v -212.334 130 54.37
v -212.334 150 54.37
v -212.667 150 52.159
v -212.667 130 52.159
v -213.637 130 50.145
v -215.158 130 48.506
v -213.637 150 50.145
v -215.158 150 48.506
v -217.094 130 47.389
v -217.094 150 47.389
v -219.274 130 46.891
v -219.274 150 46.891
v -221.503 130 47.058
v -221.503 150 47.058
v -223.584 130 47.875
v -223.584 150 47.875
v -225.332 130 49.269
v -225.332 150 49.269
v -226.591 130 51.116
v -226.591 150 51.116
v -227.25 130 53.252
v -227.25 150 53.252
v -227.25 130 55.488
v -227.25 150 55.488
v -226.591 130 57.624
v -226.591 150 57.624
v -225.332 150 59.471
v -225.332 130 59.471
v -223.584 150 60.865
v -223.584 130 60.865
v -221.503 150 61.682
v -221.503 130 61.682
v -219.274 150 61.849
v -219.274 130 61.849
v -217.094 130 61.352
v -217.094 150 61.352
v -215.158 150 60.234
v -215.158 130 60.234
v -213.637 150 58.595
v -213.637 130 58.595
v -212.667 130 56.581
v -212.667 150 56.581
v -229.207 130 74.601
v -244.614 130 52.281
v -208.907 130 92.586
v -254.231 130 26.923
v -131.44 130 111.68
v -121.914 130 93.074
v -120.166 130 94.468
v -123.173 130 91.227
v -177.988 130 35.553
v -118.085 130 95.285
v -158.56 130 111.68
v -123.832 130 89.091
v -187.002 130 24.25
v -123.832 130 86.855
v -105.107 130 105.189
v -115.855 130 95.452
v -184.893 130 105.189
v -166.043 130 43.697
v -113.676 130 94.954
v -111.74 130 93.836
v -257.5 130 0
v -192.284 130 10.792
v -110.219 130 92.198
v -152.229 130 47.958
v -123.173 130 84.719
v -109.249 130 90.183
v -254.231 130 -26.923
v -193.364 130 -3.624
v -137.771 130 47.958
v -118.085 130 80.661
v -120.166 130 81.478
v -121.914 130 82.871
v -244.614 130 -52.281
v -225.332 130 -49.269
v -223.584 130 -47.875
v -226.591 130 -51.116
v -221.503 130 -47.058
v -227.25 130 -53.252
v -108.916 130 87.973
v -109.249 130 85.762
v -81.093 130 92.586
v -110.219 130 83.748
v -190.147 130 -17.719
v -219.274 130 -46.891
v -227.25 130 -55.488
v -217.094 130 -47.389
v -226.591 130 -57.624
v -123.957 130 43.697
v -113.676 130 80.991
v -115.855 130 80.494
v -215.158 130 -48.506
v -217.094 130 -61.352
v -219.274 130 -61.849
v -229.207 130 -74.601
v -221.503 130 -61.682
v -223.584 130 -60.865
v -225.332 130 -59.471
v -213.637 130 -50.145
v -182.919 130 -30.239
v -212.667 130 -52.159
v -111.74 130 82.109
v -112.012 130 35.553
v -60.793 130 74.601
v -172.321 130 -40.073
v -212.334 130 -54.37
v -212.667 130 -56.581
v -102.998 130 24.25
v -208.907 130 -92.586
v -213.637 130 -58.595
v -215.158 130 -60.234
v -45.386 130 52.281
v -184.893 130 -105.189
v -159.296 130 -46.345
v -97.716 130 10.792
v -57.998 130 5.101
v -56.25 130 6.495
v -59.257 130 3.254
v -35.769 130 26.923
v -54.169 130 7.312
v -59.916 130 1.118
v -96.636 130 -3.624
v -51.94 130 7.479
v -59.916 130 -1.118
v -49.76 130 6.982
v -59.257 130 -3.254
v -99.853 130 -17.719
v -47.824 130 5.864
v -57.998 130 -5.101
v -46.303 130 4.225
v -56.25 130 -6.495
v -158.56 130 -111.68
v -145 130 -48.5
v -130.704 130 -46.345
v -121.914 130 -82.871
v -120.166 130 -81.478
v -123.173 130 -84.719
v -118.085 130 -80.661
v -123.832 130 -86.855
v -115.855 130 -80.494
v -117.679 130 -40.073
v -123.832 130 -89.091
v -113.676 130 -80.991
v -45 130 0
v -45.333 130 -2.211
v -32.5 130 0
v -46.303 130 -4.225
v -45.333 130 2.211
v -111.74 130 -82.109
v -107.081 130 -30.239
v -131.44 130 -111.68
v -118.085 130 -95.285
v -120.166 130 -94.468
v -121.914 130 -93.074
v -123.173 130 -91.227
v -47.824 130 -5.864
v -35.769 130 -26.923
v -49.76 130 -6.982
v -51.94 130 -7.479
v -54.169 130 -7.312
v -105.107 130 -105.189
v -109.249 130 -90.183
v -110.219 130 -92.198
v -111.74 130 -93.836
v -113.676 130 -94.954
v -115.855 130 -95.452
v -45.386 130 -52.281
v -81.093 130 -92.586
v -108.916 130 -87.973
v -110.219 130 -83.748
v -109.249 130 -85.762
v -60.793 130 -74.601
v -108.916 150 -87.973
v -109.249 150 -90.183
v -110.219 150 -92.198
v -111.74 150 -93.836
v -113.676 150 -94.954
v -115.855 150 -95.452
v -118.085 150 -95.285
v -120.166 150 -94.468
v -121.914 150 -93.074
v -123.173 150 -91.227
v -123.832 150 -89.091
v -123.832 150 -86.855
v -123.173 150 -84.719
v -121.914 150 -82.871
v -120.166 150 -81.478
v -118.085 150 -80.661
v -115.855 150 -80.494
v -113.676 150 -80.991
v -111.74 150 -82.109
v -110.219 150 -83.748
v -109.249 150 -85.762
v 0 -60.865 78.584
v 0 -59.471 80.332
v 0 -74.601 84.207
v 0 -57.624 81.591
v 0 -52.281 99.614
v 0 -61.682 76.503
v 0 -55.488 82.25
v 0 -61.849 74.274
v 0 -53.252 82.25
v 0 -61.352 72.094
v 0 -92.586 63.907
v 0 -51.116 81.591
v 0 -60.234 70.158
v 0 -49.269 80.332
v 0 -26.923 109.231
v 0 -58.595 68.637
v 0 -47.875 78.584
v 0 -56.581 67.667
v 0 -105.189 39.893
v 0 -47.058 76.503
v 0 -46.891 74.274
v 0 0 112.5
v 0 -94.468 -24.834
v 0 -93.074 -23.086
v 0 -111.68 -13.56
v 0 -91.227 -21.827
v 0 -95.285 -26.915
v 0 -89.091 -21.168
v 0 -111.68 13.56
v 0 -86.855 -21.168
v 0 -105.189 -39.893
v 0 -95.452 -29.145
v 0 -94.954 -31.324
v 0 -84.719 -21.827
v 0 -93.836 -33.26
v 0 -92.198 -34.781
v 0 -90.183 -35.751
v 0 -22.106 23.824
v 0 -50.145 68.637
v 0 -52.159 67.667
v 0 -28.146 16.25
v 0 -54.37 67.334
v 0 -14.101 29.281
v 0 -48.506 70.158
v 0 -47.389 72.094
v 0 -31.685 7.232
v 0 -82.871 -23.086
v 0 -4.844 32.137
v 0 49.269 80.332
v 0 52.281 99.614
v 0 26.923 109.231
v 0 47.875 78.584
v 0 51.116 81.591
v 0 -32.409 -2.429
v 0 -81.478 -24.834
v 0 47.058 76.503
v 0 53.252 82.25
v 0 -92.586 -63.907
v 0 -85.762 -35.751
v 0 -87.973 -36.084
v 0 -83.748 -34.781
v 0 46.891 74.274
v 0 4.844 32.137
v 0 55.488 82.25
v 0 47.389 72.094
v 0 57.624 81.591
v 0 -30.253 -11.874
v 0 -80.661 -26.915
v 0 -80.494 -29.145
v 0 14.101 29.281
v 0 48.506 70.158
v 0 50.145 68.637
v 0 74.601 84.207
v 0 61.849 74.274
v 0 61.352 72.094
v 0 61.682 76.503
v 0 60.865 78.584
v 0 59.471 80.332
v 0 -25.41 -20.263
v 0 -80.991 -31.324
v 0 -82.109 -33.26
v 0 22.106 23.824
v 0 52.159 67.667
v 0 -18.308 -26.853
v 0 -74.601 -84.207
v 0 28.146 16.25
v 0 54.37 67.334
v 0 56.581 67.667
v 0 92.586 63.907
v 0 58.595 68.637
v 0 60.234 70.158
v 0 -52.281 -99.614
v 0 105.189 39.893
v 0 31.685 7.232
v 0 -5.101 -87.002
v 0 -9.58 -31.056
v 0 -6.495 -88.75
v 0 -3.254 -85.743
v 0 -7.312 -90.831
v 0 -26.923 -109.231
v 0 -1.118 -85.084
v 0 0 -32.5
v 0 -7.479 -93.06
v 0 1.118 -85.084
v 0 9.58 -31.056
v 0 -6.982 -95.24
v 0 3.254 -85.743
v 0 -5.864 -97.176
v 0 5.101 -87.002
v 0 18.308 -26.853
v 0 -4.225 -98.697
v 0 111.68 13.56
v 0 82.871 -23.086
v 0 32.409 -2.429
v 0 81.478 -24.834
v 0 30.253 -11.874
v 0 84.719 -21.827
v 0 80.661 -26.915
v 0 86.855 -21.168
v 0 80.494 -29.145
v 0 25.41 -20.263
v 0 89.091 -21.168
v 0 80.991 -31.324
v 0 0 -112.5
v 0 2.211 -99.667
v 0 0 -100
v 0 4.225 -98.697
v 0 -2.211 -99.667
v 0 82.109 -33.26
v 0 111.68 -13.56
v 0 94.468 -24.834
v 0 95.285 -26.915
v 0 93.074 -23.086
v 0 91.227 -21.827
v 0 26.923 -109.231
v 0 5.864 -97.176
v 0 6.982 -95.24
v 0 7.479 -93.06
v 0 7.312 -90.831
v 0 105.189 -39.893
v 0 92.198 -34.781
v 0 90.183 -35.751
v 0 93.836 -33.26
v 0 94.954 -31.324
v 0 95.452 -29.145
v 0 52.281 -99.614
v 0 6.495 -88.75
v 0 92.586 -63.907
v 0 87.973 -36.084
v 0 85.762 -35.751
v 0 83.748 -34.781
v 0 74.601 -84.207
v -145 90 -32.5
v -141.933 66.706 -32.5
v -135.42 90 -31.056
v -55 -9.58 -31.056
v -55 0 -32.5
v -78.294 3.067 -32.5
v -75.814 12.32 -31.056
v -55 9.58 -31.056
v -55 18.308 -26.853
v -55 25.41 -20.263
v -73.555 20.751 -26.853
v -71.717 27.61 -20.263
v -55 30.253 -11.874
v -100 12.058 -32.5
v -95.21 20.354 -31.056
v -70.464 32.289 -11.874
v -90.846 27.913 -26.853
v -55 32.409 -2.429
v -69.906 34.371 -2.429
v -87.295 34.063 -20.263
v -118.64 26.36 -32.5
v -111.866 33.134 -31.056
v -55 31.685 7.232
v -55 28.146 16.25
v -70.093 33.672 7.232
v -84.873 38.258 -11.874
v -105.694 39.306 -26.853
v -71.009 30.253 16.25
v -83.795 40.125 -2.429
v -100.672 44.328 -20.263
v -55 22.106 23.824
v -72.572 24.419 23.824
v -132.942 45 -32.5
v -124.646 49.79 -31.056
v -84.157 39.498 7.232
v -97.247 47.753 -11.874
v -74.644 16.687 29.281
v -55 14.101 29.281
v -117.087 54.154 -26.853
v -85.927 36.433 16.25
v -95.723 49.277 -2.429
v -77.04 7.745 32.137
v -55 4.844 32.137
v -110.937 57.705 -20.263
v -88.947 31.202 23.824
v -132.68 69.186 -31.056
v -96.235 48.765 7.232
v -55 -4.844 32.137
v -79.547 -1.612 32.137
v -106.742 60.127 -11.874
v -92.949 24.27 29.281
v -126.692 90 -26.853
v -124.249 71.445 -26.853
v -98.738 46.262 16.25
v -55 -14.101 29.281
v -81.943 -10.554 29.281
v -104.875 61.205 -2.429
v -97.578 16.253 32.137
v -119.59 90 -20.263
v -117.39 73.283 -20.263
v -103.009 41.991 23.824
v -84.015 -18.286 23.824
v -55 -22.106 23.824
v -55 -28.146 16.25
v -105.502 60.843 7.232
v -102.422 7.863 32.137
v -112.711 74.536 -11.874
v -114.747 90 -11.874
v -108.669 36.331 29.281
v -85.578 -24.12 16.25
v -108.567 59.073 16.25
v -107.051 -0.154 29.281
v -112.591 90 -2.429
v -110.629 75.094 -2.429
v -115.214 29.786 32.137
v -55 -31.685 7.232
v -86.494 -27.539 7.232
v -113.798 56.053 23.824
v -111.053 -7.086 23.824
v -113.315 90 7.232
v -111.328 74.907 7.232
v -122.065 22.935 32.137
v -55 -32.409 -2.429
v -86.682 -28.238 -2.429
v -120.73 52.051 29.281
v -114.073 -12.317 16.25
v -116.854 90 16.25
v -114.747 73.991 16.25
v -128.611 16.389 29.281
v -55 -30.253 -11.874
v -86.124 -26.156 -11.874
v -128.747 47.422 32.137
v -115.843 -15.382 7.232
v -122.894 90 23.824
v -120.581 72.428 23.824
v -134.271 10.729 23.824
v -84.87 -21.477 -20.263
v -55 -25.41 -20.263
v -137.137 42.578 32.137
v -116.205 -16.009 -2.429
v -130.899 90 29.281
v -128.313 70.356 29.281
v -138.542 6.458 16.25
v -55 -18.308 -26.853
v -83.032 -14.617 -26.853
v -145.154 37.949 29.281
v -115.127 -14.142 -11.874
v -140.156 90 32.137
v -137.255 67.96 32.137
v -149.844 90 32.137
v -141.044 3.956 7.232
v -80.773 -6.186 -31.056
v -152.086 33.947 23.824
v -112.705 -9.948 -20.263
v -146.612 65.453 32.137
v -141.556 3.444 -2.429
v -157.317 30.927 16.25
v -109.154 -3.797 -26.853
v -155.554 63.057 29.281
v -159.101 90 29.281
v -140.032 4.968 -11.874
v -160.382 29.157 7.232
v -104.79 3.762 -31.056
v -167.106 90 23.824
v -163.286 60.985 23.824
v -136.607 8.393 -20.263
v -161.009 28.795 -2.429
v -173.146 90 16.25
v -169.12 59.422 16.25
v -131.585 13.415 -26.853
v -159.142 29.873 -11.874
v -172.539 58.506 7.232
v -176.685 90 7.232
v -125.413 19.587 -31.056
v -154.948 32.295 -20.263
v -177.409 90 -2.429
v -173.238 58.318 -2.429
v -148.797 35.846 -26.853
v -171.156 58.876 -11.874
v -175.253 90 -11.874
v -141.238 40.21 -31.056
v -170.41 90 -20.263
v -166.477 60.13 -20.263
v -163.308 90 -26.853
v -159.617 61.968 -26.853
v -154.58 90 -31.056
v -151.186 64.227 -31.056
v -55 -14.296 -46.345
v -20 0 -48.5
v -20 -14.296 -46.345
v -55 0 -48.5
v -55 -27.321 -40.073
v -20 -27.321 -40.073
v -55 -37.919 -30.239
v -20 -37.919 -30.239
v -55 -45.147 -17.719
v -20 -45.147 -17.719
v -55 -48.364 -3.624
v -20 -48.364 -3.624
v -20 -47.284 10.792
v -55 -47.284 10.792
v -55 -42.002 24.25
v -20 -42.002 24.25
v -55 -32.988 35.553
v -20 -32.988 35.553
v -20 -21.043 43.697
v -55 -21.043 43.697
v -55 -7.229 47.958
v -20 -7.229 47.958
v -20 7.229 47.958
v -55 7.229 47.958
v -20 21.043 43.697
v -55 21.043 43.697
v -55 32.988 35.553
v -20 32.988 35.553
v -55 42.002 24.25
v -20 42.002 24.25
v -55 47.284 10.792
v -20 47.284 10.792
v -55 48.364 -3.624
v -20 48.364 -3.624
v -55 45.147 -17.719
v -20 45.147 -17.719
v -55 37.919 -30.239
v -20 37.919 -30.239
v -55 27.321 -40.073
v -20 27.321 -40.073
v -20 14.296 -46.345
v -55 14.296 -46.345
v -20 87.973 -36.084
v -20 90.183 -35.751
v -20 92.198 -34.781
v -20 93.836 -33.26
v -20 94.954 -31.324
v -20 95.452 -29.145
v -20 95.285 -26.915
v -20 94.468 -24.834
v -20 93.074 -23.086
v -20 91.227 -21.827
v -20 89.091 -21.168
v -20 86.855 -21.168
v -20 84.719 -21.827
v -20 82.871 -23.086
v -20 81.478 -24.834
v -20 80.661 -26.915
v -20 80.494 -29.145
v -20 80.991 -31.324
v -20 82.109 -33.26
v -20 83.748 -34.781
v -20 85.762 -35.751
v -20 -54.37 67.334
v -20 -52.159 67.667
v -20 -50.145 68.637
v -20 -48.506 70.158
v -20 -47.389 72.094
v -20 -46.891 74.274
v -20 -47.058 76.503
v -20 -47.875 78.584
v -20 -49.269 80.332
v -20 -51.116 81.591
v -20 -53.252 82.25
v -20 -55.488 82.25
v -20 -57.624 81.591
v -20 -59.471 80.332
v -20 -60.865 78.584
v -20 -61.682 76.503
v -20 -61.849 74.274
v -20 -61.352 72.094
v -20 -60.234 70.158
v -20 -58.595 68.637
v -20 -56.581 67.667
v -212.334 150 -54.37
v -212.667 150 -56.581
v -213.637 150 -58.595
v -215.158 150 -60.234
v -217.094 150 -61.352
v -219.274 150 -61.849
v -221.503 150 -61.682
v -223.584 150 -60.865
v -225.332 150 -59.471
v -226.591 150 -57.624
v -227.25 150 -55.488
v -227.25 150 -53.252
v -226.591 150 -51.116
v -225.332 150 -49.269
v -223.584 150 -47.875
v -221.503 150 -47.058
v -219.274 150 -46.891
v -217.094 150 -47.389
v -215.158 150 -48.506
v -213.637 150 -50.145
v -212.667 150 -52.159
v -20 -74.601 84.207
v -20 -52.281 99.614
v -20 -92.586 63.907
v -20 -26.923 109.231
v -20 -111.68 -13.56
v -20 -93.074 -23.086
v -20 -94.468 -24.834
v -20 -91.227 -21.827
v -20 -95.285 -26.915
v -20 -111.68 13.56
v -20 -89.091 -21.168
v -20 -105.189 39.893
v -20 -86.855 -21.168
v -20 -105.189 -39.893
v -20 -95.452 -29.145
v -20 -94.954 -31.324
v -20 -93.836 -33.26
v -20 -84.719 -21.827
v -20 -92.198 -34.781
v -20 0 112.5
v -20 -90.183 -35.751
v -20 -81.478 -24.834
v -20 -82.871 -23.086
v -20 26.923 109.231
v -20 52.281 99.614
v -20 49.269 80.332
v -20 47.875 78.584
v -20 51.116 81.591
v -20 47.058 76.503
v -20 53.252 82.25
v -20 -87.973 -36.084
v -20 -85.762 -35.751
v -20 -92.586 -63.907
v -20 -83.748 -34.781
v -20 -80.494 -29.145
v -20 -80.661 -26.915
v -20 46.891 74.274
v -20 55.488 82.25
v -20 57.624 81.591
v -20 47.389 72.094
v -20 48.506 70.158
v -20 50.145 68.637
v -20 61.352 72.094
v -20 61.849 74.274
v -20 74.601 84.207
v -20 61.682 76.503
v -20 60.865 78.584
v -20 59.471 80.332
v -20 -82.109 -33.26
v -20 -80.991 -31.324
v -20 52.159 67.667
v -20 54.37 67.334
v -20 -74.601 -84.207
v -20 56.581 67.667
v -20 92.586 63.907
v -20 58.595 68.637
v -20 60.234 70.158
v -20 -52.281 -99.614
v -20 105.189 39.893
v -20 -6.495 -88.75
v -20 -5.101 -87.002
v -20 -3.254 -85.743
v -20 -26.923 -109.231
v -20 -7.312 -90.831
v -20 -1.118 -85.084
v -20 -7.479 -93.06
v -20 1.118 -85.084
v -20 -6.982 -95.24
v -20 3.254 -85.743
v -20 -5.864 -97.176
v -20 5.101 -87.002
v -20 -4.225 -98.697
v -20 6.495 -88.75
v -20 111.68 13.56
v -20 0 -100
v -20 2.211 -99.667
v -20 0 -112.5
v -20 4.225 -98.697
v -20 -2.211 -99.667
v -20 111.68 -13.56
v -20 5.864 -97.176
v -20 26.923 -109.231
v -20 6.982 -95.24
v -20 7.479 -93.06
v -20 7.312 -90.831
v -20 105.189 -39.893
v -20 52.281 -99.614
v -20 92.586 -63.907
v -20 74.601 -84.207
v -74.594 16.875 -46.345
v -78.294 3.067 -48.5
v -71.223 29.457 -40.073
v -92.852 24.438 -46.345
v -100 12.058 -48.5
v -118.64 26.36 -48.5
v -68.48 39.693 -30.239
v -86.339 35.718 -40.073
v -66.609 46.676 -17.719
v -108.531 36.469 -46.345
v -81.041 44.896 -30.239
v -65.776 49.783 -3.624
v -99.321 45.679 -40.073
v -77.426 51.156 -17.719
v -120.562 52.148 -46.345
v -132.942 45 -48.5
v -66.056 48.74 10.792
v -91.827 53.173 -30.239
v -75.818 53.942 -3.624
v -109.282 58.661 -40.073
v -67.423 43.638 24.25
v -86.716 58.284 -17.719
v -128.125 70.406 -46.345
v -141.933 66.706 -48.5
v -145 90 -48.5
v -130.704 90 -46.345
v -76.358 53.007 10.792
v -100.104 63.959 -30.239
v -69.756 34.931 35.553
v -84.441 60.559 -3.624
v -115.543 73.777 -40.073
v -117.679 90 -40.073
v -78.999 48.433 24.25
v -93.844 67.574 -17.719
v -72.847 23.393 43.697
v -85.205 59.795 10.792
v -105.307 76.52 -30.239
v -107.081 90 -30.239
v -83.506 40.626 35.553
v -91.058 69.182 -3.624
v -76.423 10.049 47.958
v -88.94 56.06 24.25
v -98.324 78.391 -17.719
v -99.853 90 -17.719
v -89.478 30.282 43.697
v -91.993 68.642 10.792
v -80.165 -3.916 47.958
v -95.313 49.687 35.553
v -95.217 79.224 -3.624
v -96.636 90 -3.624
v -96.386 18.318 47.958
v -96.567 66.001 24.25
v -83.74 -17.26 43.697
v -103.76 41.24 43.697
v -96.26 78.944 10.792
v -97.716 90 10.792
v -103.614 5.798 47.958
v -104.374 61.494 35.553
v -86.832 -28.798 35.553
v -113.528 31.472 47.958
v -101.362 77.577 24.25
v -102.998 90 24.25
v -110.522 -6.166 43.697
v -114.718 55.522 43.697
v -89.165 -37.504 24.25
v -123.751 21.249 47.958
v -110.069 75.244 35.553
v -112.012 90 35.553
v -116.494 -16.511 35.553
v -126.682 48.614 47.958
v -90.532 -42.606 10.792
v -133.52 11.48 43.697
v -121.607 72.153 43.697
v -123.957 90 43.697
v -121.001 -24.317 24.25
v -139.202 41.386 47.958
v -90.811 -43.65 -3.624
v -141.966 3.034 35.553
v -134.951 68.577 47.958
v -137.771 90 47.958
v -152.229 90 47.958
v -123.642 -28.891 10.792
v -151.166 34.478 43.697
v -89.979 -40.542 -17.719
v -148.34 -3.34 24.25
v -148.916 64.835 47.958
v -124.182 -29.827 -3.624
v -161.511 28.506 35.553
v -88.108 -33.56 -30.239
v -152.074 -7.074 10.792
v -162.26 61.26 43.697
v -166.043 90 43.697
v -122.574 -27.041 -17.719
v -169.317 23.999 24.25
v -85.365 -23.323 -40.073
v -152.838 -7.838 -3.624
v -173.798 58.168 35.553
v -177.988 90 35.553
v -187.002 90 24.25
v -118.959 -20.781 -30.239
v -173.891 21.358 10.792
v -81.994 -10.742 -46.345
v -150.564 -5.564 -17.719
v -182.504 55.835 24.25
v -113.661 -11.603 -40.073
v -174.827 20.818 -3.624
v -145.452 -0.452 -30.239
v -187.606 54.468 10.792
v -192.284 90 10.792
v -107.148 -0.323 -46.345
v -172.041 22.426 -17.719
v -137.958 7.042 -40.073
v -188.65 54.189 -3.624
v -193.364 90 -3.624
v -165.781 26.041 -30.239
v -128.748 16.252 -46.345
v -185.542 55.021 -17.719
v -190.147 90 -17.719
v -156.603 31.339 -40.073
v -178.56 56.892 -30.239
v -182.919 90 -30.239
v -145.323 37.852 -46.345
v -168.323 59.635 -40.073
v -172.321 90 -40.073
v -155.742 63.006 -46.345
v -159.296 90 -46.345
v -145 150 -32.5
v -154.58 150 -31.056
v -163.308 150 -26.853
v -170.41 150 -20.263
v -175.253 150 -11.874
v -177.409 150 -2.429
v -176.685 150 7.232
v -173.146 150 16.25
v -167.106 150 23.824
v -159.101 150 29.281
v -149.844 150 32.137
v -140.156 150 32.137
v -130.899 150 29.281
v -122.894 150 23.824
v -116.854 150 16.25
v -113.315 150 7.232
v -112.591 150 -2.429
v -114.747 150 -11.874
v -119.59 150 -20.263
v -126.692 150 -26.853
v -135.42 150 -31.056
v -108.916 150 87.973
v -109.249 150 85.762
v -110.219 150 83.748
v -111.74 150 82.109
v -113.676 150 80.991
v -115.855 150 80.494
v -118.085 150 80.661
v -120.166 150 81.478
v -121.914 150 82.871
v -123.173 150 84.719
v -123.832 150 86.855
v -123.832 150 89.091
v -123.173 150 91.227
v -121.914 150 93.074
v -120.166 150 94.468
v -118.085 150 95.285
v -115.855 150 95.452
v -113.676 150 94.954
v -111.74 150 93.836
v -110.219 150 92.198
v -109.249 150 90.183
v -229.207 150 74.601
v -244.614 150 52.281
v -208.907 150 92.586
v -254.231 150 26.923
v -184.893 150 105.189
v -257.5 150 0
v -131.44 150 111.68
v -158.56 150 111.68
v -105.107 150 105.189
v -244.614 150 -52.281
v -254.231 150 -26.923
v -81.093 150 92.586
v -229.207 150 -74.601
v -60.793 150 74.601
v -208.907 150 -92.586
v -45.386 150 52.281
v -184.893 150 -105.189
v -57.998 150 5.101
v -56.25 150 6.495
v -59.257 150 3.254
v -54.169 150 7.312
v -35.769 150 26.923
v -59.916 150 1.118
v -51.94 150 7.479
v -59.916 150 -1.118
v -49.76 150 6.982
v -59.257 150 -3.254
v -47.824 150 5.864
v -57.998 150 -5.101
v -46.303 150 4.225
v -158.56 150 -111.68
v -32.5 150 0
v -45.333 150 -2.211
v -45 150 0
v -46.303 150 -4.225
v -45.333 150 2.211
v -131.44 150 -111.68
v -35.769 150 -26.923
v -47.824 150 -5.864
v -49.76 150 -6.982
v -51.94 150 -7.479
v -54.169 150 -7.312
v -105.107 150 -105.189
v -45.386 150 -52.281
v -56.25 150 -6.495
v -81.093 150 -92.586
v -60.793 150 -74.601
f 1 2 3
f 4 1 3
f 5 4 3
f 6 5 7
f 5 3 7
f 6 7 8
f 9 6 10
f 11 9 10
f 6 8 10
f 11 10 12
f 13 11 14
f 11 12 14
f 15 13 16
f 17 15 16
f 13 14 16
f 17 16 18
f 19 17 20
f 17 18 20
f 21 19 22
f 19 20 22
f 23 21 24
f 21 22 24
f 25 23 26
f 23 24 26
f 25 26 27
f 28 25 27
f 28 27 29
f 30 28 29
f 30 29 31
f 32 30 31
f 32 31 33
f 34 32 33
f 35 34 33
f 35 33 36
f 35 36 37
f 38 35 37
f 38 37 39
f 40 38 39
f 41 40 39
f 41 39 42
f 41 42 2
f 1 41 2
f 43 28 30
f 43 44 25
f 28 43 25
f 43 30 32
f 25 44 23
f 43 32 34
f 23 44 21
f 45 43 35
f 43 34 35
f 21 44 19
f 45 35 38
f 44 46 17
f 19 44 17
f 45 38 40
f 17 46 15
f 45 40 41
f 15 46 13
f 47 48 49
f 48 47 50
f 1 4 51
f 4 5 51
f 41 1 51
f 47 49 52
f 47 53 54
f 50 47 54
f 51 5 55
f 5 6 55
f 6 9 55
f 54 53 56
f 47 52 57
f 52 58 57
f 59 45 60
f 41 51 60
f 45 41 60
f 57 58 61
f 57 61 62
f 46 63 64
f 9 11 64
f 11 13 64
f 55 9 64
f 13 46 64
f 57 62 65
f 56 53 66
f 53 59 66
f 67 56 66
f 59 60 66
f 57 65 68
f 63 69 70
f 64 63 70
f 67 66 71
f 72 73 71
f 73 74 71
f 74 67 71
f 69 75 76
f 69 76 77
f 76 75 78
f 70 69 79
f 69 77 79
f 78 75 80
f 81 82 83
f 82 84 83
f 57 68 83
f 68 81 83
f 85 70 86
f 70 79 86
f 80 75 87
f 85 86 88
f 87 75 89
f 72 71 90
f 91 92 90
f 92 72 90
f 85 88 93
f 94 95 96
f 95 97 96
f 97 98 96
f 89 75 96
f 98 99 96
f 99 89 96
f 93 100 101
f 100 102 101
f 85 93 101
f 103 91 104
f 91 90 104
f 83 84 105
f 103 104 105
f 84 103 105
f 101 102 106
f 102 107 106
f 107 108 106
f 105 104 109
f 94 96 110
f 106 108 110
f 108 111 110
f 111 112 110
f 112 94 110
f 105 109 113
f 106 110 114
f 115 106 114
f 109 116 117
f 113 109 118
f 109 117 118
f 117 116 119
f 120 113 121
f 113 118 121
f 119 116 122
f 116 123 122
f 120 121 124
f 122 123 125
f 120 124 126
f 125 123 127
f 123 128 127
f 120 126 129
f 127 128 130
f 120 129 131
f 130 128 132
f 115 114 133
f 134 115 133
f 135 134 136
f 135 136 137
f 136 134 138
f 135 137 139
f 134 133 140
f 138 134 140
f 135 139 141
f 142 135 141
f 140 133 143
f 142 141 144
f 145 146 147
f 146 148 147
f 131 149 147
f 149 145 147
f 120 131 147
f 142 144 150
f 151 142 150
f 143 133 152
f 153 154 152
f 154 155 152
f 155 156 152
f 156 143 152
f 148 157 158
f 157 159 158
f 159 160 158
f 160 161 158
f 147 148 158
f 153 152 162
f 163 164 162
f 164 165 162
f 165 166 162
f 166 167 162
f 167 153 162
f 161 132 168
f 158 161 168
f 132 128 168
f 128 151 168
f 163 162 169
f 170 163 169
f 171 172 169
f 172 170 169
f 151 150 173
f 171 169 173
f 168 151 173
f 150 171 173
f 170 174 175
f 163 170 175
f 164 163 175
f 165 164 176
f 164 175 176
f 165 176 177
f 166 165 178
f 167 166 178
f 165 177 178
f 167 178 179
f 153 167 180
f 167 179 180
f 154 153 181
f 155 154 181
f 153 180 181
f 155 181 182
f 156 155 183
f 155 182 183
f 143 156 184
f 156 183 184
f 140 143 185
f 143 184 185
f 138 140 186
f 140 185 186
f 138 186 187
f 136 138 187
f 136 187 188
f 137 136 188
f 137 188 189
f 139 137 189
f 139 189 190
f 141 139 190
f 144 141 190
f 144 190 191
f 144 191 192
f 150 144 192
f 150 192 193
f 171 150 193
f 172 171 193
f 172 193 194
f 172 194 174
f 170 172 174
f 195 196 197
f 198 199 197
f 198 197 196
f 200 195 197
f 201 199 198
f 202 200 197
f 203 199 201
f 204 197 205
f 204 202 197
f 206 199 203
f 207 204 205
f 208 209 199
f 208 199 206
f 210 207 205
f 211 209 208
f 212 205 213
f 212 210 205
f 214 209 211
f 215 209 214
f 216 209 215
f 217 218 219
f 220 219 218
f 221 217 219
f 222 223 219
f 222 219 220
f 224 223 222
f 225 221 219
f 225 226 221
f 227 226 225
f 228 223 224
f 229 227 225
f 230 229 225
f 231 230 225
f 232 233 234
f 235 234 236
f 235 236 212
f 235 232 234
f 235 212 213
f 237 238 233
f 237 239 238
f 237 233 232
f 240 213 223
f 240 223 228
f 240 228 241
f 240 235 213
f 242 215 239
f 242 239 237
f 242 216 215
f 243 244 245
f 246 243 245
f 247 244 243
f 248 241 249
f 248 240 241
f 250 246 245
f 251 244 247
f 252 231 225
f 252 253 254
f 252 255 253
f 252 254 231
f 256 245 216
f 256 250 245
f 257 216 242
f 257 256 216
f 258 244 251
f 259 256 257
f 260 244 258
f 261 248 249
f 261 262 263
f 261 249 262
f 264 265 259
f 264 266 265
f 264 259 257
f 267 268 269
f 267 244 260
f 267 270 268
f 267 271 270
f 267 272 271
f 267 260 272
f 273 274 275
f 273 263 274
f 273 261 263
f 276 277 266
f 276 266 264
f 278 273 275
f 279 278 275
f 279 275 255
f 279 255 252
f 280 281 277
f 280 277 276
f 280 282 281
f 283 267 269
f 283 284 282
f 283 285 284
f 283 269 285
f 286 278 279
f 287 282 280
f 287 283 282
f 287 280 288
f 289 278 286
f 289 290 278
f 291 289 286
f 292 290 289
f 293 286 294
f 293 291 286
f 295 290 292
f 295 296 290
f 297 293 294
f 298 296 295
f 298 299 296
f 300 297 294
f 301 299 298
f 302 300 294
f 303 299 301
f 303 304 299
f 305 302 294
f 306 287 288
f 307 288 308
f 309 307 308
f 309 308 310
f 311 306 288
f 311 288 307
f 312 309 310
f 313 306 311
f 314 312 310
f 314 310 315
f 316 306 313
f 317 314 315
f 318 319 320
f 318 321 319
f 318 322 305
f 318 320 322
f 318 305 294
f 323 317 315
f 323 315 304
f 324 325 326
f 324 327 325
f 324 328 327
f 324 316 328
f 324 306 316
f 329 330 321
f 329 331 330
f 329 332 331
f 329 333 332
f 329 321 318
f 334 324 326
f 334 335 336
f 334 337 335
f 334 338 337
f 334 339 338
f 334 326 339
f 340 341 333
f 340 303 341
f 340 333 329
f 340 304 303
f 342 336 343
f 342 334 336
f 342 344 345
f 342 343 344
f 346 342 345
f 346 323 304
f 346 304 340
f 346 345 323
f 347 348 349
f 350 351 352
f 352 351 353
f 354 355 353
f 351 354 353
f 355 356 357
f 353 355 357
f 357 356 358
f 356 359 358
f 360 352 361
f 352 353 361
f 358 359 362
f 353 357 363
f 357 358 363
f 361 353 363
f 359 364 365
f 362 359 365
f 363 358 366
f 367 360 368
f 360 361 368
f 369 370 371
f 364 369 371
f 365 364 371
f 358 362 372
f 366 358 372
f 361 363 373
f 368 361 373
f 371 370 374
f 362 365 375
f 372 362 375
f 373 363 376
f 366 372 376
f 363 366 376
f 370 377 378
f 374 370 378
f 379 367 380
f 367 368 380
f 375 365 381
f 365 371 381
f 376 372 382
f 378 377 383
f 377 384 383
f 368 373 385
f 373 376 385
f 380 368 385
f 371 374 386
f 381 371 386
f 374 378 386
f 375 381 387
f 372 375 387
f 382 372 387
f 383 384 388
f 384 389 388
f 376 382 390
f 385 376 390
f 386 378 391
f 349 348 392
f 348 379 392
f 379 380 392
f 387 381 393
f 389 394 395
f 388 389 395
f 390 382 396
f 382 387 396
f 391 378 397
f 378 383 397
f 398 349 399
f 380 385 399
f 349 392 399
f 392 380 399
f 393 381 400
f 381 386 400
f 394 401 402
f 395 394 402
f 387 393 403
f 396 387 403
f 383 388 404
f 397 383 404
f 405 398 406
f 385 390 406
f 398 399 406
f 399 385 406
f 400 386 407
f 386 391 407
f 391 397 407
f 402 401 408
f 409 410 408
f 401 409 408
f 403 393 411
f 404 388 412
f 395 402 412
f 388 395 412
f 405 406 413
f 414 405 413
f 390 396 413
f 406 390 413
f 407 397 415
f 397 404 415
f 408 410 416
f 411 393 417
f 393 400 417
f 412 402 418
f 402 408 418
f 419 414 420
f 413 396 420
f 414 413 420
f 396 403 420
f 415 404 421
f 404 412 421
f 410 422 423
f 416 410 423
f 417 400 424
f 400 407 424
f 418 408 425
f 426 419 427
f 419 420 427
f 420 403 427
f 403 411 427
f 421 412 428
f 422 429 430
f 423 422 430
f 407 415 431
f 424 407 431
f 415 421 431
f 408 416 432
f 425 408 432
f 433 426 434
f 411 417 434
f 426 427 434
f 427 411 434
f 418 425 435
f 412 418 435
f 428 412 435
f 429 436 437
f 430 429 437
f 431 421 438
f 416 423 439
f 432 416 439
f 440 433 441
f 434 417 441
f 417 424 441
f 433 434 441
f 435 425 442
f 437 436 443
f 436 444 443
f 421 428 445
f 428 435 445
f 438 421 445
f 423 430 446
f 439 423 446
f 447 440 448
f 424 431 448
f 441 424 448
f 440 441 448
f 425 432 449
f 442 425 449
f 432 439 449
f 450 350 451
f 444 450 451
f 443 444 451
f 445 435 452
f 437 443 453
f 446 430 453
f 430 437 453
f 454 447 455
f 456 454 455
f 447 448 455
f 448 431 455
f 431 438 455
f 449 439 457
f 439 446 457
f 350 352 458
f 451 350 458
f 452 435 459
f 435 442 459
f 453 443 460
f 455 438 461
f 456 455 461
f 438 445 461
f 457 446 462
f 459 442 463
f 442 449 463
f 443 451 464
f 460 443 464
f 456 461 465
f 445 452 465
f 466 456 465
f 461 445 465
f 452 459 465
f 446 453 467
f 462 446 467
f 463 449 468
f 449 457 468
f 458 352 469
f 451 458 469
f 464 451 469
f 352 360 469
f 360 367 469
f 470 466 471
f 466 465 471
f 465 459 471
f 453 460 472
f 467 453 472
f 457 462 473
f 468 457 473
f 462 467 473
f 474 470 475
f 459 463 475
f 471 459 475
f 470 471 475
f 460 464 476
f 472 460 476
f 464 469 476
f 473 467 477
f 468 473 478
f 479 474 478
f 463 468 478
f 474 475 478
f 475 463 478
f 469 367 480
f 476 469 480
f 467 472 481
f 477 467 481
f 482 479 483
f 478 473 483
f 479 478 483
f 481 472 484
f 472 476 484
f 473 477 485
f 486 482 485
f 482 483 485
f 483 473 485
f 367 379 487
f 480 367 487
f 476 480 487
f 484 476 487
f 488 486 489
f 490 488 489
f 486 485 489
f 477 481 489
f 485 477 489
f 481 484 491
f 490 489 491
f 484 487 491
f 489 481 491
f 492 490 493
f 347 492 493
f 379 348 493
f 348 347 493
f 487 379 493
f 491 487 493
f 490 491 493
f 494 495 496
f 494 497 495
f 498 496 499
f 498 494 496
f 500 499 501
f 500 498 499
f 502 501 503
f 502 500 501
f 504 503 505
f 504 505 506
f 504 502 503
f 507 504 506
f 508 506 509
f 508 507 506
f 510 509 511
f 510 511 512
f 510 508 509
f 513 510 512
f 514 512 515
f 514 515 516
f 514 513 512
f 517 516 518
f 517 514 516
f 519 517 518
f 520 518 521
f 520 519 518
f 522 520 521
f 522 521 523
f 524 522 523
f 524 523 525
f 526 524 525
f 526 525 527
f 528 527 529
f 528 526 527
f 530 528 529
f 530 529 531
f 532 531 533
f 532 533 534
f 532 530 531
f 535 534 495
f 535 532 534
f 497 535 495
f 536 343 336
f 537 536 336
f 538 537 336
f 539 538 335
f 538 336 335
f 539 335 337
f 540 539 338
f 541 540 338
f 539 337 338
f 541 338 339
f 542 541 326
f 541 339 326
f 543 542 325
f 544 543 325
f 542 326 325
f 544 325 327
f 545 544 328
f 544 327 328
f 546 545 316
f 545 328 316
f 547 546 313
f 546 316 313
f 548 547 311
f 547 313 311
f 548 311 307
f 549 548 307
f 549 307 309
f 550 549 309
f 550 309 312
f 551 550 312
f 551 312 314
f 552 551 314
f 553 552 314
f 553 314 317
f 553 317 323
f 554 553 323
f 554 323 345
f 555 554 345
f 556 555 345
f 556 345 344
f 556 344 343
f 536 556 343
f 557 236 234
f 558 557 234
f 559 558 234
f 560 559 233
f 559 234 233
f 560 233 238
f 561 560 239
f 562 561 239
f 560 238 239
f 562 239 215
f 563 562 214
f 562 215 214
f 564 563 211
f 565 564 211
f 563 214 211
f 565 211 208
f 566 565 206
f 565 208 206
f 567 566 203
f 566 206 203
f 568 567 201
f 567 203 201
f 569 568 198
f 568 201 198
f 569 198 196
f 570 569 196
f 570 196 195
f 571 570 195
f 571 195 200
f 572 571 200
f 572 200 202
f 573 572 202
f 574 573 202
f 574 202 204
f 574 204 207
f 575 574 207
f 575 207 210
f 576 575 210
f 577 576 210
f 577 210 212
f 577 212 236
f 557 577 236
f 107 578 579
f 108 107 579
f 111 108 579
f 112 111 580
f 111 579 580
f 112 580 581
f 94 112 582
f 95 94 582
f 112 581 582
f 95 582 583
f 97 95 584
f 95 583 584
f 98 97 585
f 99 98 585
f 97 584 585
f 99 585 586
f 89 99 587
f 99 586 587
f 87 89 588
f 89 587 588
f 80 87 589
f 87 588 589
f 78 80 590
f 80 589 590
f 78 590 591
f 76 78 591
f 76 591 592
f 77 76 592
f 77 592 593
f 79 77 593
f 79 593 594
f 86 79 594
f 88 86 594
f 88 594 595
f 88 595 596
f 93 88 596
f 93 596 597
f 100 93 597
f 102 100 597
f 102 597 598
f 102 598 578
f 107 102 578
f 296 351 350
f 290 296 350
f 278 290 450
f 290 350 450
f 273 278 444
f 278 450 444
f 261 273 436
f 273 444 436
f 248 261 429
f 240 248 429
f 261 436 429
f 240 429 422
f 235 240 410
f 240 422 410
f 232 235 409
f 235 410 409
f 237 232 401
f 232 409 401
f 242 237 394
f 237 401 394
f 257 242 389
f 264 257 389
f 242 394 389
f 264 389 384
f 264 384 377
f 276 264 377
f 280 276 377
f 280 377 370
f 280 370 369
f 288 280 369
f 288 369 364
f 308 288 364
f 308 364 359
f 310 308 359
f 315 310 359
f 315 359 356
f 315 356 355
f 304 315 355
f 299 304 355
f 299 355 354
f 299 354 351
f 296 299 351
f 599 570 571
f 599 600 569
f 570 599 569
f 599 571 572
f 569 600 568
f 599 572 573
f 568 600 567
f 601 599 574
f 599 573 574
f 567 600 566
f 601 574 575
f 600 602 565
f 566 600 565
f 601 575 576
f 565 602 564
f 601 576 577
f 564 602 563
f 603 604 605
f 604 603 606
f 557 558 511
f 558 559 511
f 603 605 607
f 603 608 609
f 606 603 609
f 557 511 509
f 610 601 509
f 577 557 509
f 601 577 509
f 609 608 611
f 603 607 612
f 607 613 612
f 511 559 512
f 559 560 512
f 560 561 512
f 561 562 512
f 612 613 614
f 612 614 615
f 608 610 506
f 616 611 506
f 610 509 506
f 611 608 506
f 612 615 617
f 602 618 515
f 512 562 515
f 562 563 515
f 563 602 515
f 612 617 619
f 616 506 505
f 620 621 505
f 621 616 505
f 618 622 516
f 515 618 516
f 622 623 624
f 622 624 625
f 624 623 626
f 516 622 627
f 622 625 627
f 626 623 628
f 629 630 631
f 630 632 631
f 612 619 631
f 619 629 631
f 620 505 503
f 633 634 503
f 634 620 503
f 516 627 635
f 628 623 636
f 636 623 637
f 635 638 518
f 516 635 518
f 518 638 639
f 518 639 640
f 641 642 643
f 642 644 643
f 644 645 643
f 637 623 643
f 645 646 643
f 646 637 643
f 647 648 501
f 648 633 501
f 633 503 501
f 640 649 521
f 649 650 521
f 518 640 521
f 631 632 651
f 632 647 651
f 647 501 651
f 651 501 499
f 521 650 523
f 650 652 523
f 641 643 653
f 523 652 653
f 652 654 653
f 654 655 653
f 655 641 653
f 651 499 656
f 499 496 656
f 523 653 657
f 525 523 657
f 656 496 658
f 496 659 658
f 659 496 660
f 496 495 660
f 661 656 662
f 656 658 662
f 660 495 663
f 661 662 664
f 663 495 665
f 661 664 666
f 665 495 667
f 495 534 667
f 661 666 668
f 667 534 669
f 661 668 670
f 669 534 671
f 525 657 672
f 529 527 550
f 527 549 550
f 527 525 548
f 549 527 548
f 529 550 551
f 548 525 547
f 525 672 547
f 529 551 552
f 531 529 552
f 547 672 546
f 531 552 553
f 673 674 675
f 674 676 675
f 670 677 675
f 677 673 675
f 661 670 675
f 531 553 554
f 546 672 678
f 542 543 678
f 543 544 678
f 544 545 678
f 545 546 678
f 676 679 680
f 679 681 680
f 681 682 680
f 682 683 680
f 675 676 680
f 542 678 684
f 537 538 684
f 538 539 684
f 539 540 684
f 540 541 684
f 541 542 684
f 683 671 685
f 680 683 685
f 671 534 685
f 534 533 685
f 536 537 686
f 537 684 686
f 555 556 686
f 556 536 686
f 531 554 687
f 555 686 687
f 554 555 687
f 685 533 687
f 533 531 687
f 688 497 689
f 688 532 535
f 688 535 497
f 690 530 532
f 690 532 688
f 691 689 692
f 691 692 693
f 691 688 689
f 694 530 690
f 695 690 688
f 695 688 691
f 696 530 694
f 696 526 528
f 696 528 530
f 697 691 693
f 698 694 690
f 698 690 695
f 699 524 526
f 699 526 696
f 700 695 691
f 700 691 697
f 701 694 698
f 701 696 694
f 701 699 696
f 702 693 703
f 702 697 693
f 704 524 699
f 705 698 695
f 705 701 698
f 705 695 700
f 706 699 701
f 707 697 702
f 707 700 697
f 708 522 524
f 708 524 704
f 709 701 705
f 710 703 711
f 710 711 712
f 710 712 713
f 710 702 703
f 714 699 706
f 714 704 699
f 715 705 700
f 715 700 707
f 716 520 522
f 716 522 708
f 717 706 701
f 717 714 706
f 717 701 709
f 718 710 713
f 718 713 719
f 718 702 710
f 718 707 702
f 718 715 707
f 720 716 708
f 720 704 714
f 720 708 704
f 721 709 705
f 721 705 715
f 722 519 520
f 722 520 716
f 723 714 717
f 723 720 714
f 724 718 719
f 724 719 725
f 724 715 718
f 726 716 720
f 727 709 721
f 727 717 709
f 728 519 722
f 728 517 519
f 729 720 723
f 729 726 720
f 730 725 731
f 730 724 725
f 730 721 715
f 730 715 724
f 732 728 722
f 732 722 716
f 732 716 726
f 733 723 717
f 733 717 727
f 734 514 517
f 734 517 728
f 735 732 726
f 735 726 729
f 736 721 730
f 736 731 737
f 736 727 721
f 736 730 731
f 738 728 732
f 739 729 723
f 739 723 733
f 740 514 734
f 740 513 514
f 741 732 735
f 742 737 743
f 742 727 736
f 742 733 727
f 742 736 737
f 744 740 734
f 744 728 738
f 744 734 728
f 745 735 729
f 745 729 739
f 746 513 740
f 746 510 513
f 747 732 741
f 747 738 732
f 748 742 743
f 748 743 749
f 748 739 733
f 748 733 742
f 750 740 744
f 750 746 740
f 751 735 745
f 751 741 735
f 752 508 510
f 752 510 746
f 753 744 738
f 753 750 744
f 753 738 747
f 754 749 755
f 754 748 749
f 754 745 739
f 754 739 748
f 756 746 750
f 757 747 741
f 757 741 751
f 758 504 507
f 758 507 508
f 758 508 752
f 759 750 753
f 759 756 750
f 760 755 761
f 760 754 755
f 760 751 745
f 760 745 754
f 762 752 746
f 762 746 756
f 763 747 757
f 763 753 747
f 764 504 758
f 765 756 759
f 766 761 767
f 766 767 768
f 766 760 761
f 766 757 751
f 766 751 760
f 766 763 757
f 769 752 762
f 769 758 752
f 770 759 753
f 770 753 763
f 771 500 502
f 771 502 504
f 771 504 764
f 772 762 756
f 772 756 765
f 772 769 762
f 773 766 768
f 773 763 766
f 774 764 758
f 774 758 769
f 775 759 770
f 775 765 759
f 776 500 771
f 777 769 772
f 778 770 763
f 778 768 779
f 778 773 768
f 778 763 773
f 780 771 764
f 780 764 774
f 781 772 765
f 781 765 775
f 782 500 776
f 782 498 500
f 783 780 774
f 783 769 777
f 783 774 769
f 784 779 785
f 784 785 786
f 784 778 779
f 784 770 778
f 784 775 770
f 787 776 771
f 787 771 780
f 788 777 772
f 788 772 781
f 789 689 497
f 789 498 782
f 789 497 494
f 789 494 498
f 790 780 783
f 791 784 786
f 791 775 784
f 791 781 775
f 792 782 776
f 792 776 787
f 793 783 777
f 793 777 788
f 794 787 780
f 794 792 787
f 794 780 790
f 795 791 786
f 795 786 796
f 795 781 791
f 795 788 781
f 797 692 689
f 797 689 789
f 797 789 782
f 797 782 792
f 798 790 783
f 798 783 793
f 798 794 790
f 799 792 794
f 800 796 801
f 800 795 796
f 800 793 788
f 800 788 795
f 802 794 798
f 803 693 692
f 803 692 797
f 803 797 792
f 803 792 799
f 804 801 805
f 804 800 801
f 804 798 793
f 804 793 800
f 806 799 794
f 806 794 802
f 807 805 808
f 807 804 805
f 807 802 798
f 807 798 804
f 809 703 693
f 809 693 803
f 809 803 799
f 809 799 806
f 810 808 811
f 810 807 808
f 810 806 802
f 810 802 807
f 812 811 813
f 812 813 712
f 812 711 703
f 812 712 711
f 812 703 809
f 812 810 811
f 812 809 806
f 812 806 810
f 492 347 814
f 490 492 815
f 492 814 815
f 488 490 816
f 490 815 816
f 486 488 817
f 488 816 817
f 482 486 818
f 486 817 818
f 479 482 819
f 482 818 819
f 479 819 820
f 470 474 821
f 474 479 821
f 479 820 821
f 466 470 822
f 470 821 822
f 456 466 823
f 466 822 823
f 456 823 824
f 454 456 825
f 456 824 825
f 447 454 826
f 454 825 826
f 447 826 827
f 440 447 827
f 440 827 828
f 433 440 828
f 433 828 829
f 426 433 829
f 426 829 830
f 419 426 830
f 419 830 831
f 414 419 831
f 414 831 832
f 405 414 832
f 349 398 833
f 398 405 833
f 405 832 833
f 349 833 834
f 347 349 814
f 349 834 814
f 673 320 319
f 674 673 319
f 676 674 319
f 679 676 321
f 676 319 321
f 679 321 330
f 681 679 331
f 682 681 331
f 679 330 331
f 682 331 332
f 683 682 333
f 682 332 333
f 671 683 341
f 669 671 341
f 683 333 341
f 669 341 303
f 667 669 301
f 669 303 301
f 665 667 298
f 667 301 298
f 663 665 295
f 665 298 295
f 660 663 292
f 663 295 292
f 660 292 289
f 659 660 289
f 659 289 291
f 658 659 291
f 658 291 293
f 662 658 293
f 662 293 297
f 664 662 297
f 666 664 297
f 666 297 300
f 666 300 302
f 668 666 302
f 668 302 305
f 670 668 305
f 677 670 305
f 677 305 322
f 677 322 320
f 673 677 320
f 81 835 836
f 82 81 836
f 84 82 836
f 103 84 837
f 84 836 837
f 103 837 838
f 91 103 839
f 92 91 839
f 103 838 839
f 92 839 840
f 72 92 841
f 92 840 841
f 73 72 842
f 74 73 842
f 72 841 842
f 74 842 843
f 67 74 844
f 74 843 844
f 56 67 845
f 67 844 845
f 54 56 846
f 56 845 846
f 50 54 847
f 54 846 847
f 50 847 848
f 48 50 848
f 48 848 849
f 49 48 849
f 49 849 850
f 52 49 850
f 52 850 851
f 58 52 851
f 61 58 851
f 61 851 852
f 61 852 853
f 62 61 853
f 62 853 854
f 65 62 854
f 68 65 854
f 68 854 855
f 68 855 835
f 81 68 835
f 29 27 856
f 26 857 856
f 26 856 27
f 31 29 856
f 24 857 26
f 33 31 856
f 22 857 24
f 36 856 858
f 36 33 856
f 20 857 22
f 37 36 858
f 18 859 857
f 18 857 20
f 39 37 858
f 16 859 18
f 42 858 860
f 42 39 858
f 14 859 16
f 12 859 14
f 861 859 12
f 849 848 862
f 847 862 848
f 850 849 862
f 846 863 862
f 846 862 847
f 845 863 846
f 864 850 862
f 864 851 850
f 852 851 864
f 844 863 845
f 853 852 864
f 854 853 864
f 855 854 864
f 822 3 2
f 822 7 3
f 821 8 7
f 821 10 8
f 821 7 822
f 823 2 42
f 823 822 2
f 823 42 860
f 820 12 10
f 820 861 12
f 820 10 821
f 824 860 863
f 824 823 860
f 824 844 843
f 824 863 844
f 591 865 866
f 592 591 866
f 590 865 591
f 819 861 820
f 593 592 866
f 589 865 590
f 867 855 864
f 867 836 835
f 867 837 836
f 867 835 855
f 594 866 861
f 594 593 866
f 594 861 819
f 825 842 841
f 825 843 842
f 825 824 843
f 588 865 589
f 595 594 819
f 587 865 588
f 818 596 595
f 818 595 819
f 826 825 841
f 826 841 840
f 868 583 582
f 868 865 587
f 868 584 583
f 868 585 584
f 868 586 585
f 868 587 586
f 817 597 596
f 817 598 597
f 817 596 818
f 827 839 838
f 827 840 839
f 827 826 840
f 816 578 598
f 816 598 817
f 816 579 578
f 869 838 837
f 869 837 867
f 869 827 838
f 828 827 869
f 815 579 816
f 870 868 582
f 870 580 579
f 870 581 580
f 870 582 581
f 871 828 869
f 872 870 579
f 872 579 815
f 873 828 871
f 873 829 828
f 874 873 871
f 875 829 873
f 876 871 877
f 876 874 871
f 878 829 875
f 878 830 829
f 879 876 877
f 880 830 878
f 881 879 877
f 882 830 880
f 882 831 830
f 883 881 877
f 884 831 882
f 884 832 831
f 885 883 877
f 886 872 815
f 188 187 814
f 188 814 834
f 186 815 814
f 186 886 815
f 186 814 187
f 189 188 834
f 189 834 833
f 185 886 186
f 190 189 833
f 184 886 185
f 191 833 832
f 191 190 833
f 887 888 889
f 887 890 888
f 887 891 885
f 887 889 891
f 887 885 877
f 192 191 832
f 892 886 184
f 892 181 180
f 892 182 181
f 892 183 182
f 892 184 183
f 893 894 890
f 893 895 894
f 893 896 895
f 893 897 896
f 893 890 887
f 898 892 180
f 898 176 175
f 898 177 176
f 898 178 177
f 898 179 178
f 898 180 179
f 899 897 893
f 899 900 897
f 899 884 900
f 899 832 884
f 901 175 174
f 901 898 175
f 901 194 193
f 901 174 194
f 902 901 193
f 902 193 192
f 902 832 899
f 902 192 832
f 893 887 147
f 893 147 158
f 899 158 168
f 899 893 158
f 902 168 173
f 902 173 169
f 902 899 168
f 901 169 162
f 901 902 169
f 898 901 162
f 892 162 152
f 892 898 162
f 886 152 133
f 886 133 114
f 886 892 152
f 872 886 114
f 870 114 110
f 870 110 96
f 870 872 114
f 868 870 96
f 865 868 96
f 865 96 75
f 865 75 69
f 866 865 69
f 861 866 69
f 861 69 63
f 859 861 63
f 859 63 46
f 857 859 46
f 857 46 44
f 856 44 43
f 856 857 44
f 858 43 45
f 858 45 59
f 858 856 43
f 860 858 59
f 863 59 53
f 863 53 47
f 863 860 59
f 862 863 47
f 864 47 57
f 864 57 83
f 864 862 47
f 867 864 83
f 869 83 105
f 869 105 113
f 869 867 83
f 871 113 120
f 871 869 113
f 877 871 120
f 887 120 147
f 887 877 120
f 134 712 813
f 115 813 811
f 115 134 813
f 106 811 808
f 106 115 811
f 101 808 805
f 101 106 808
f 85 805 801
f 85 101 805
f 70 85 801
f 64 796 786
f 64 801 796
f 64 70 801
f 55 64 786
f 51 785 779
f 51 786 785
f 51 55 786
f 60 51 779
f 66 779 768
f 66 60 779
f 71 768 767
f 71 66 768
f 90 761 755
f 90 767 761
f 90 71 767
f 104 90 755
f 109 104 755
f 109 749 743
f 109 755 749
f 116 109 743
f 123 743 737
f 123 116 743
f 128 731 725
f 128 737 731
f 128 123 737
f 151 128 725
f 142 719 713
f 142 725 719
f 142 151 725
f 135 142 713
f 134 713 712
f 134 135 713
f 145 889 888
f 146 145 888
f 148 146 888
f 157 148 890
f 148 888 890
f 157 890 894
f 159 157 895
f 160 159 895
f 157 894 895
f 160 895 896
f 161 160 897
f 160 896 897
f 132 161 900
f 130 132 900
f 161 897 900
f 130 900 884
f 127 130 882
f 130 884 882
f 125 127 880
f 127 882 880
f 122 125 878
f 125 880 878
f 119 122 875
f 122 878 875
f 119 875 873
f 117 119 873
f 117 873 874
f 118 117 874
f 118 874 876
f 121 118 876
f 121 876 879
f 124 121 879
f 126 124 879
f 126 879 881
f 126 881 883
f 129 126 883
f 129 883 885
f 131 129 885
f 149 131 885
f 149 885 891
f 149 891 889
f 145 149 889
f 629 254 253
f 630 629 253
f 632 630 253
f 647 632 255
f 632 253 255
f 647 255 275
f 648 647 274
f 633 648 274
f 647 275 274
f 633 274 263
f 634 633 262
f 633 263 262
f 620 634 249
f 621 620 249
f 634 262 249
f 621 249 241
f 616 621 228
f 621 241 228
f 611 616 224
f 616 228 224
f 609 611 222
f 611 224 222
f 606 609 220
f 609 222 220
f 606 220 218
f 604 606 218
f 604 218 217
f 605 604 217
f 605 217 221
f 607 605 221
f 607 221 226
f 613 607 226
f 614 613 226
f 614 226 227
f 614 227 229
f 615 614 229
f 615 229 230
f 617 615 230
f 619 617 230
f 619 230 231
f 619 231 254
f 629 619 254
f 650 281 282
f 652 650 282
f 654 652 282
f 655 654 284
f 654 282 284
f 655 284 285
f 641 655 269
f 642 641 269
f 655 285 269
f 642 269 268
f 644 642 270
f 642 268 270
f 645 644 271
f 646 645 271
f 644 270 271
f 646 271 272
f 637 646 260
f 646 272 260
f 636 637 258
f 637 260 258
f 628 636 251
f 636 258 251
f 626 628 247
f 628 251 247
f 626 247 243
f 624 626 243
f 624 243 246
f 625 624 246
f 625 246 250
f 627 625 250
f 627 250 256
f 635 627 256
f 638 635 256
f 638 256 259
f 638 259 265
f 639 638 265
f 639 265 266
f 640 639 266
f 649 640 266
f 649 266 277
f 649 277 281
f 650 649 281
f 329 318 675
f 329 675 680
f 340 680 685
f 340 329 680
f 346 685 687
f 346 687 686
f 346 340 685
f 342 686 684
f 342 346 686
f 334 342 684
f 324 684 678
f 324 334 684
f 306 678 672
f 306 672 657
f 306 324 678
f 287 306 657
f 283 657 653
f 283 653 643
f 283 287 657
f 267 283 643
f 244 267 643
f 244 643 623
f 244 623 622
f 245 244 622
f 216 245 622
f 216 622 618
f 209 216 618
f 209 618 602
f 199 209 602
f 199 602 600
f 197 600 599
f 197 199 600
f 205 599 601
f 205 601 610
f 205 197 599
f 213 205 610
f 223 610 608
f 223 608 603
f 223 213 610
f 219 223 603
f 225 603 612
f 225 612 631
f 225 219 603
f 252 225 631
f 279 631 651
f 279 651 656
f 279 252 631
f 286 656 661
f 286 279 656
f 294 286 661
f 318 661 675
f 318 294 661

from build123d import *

# Parameters (mm, degrees)
SKETCH2_R           = 48.5
SKETCH3_R           = 112.5
BOSS_EXTRUDE1_DEPTH = 20
SKETCH4_R           = 112.5
BOSS_EXTRUDE2_DEPTH = 20
SKETCH5_R           = 32.5
SKETCH6_R           = 7.5
CUT_EXTRUDE1_DEPTH  = 30
SKETCH7_R           = 7.5
CUT_EXTRUDE3_DEPTH  = 30


with BuildPart() as part:
    # Sweep1: sweep along a path in Sketch1
    with BuildLine(Plane.XY) as sweep1_path:
        Line((0, 0), (-55, 0))
        ThreePointArc((-55, 0), (-118.639610307, 26.360389693), (-145, 90))
        Line((-145, 90), (-145, 150))
    # Sketch2 → Sweep1 (sweep)
    with BuildSketch(Plane(origin=(0, 0, 0), x_dir=(0, 0, -1), z_dir=(1, 0, 0))):
        Circle(SKETCH2_R)
    sweep(path=sweep1_path.line)

    # Sketch3 → Boss-Extrude1 (add)
    with BuildSketch(Plane(origin=(0, 0, 0), x_dir=(0, 0, -1), z_dir=(1, 0, 0))):
        Circle(SKETCH3_R)
    extrude(amount=-BOSS_EXTRUDE1_DEPTH)

    # Sketch4 → Boss-Extrude2 (add)
    with BuildSketch(Plane(origin=(0, 150, 0), x_dir=(1, 0, 0), z_dir=(0, 1, 0))):
        with Locations((-145, 0)):
            Circle(SKETCH4_R)
    extrude(amount=-BOSS_EXTRUDE2_DEPTH)

    # Cut-Sweep1: sweep along a path in Sketch1<2>
    with BuildLine(Plane.XY) as cut_sweep1_path:
        Line((0, 0), (-55, 0))
        ThreePointArc((-55, 0), (-118.639610307, 26.360389693), (-145, 90))
        Line((-145, 90), (-145, 150))
    # Sketch5 → Cut-Sweep1 (sweep, cut)
    with BuildSketch(Plane(origin=(0, 0, 0), x_dir=(0, 0, -1), z_dir=(1, 0, 0))):
        Circle(SKETCH5_R)
    sweep(path=cut_sweep1_path.line, mode=Mode.SUBTRACT)

    # Sketch6 → Cut-Extrude1 (cut)
    with BuildSketch(Plane(origin=(0, 150, 0), x_dir=(1, 0, 0), z_dir=(0, 1, 0))):
        with Locations((-52.5, 0)):
            Circle(SKETCH6_R)
        with Locations((-116.41592802, -87.972727757)):
            Circle(SKETCH6_R)
        with Locations((-219.83407198, -54.370135837)):
            Circle(SKETCH6_R)
        with Locations((-219.83407198, 54.370135837)):
            Circle(SKETCH6_R)
        with Locations((-116.41592802, 87.972727757)):
            Circle(SKETCH6_R)
    extrude(amount=-CUT_EXTRUDE1_DEPTH, mode=Mode.SUBTRACT)

    # Sketch7 → Cut-Extrude3 (cut)
    with BuildSketch(Plane(origin=(0, 0, 0), x_dir=(0, 0, -1), z_dir=(1, 0, 0))):
        with Locations((92.5, 0)):
            Circle(SKETCH7_R)
        with Locations((28.58407198, -87.972727757)):
            Circle(SKETCH7_R)
        with Locations((-74.83407198, -54.370135837)):
            Circle(SKETCH7_R)
        with Locations((-74.83407198, 54.370135837)):
            Circle(SKETCH7_R)
        with Locations((28.58407198, 87.972727757)):
            Circle(SKETCH7_R)
    extrude(amount=-CUT_EXTRUDE3_DEPTH, mode=Mode.SUBTRACT)


solid = part.part
